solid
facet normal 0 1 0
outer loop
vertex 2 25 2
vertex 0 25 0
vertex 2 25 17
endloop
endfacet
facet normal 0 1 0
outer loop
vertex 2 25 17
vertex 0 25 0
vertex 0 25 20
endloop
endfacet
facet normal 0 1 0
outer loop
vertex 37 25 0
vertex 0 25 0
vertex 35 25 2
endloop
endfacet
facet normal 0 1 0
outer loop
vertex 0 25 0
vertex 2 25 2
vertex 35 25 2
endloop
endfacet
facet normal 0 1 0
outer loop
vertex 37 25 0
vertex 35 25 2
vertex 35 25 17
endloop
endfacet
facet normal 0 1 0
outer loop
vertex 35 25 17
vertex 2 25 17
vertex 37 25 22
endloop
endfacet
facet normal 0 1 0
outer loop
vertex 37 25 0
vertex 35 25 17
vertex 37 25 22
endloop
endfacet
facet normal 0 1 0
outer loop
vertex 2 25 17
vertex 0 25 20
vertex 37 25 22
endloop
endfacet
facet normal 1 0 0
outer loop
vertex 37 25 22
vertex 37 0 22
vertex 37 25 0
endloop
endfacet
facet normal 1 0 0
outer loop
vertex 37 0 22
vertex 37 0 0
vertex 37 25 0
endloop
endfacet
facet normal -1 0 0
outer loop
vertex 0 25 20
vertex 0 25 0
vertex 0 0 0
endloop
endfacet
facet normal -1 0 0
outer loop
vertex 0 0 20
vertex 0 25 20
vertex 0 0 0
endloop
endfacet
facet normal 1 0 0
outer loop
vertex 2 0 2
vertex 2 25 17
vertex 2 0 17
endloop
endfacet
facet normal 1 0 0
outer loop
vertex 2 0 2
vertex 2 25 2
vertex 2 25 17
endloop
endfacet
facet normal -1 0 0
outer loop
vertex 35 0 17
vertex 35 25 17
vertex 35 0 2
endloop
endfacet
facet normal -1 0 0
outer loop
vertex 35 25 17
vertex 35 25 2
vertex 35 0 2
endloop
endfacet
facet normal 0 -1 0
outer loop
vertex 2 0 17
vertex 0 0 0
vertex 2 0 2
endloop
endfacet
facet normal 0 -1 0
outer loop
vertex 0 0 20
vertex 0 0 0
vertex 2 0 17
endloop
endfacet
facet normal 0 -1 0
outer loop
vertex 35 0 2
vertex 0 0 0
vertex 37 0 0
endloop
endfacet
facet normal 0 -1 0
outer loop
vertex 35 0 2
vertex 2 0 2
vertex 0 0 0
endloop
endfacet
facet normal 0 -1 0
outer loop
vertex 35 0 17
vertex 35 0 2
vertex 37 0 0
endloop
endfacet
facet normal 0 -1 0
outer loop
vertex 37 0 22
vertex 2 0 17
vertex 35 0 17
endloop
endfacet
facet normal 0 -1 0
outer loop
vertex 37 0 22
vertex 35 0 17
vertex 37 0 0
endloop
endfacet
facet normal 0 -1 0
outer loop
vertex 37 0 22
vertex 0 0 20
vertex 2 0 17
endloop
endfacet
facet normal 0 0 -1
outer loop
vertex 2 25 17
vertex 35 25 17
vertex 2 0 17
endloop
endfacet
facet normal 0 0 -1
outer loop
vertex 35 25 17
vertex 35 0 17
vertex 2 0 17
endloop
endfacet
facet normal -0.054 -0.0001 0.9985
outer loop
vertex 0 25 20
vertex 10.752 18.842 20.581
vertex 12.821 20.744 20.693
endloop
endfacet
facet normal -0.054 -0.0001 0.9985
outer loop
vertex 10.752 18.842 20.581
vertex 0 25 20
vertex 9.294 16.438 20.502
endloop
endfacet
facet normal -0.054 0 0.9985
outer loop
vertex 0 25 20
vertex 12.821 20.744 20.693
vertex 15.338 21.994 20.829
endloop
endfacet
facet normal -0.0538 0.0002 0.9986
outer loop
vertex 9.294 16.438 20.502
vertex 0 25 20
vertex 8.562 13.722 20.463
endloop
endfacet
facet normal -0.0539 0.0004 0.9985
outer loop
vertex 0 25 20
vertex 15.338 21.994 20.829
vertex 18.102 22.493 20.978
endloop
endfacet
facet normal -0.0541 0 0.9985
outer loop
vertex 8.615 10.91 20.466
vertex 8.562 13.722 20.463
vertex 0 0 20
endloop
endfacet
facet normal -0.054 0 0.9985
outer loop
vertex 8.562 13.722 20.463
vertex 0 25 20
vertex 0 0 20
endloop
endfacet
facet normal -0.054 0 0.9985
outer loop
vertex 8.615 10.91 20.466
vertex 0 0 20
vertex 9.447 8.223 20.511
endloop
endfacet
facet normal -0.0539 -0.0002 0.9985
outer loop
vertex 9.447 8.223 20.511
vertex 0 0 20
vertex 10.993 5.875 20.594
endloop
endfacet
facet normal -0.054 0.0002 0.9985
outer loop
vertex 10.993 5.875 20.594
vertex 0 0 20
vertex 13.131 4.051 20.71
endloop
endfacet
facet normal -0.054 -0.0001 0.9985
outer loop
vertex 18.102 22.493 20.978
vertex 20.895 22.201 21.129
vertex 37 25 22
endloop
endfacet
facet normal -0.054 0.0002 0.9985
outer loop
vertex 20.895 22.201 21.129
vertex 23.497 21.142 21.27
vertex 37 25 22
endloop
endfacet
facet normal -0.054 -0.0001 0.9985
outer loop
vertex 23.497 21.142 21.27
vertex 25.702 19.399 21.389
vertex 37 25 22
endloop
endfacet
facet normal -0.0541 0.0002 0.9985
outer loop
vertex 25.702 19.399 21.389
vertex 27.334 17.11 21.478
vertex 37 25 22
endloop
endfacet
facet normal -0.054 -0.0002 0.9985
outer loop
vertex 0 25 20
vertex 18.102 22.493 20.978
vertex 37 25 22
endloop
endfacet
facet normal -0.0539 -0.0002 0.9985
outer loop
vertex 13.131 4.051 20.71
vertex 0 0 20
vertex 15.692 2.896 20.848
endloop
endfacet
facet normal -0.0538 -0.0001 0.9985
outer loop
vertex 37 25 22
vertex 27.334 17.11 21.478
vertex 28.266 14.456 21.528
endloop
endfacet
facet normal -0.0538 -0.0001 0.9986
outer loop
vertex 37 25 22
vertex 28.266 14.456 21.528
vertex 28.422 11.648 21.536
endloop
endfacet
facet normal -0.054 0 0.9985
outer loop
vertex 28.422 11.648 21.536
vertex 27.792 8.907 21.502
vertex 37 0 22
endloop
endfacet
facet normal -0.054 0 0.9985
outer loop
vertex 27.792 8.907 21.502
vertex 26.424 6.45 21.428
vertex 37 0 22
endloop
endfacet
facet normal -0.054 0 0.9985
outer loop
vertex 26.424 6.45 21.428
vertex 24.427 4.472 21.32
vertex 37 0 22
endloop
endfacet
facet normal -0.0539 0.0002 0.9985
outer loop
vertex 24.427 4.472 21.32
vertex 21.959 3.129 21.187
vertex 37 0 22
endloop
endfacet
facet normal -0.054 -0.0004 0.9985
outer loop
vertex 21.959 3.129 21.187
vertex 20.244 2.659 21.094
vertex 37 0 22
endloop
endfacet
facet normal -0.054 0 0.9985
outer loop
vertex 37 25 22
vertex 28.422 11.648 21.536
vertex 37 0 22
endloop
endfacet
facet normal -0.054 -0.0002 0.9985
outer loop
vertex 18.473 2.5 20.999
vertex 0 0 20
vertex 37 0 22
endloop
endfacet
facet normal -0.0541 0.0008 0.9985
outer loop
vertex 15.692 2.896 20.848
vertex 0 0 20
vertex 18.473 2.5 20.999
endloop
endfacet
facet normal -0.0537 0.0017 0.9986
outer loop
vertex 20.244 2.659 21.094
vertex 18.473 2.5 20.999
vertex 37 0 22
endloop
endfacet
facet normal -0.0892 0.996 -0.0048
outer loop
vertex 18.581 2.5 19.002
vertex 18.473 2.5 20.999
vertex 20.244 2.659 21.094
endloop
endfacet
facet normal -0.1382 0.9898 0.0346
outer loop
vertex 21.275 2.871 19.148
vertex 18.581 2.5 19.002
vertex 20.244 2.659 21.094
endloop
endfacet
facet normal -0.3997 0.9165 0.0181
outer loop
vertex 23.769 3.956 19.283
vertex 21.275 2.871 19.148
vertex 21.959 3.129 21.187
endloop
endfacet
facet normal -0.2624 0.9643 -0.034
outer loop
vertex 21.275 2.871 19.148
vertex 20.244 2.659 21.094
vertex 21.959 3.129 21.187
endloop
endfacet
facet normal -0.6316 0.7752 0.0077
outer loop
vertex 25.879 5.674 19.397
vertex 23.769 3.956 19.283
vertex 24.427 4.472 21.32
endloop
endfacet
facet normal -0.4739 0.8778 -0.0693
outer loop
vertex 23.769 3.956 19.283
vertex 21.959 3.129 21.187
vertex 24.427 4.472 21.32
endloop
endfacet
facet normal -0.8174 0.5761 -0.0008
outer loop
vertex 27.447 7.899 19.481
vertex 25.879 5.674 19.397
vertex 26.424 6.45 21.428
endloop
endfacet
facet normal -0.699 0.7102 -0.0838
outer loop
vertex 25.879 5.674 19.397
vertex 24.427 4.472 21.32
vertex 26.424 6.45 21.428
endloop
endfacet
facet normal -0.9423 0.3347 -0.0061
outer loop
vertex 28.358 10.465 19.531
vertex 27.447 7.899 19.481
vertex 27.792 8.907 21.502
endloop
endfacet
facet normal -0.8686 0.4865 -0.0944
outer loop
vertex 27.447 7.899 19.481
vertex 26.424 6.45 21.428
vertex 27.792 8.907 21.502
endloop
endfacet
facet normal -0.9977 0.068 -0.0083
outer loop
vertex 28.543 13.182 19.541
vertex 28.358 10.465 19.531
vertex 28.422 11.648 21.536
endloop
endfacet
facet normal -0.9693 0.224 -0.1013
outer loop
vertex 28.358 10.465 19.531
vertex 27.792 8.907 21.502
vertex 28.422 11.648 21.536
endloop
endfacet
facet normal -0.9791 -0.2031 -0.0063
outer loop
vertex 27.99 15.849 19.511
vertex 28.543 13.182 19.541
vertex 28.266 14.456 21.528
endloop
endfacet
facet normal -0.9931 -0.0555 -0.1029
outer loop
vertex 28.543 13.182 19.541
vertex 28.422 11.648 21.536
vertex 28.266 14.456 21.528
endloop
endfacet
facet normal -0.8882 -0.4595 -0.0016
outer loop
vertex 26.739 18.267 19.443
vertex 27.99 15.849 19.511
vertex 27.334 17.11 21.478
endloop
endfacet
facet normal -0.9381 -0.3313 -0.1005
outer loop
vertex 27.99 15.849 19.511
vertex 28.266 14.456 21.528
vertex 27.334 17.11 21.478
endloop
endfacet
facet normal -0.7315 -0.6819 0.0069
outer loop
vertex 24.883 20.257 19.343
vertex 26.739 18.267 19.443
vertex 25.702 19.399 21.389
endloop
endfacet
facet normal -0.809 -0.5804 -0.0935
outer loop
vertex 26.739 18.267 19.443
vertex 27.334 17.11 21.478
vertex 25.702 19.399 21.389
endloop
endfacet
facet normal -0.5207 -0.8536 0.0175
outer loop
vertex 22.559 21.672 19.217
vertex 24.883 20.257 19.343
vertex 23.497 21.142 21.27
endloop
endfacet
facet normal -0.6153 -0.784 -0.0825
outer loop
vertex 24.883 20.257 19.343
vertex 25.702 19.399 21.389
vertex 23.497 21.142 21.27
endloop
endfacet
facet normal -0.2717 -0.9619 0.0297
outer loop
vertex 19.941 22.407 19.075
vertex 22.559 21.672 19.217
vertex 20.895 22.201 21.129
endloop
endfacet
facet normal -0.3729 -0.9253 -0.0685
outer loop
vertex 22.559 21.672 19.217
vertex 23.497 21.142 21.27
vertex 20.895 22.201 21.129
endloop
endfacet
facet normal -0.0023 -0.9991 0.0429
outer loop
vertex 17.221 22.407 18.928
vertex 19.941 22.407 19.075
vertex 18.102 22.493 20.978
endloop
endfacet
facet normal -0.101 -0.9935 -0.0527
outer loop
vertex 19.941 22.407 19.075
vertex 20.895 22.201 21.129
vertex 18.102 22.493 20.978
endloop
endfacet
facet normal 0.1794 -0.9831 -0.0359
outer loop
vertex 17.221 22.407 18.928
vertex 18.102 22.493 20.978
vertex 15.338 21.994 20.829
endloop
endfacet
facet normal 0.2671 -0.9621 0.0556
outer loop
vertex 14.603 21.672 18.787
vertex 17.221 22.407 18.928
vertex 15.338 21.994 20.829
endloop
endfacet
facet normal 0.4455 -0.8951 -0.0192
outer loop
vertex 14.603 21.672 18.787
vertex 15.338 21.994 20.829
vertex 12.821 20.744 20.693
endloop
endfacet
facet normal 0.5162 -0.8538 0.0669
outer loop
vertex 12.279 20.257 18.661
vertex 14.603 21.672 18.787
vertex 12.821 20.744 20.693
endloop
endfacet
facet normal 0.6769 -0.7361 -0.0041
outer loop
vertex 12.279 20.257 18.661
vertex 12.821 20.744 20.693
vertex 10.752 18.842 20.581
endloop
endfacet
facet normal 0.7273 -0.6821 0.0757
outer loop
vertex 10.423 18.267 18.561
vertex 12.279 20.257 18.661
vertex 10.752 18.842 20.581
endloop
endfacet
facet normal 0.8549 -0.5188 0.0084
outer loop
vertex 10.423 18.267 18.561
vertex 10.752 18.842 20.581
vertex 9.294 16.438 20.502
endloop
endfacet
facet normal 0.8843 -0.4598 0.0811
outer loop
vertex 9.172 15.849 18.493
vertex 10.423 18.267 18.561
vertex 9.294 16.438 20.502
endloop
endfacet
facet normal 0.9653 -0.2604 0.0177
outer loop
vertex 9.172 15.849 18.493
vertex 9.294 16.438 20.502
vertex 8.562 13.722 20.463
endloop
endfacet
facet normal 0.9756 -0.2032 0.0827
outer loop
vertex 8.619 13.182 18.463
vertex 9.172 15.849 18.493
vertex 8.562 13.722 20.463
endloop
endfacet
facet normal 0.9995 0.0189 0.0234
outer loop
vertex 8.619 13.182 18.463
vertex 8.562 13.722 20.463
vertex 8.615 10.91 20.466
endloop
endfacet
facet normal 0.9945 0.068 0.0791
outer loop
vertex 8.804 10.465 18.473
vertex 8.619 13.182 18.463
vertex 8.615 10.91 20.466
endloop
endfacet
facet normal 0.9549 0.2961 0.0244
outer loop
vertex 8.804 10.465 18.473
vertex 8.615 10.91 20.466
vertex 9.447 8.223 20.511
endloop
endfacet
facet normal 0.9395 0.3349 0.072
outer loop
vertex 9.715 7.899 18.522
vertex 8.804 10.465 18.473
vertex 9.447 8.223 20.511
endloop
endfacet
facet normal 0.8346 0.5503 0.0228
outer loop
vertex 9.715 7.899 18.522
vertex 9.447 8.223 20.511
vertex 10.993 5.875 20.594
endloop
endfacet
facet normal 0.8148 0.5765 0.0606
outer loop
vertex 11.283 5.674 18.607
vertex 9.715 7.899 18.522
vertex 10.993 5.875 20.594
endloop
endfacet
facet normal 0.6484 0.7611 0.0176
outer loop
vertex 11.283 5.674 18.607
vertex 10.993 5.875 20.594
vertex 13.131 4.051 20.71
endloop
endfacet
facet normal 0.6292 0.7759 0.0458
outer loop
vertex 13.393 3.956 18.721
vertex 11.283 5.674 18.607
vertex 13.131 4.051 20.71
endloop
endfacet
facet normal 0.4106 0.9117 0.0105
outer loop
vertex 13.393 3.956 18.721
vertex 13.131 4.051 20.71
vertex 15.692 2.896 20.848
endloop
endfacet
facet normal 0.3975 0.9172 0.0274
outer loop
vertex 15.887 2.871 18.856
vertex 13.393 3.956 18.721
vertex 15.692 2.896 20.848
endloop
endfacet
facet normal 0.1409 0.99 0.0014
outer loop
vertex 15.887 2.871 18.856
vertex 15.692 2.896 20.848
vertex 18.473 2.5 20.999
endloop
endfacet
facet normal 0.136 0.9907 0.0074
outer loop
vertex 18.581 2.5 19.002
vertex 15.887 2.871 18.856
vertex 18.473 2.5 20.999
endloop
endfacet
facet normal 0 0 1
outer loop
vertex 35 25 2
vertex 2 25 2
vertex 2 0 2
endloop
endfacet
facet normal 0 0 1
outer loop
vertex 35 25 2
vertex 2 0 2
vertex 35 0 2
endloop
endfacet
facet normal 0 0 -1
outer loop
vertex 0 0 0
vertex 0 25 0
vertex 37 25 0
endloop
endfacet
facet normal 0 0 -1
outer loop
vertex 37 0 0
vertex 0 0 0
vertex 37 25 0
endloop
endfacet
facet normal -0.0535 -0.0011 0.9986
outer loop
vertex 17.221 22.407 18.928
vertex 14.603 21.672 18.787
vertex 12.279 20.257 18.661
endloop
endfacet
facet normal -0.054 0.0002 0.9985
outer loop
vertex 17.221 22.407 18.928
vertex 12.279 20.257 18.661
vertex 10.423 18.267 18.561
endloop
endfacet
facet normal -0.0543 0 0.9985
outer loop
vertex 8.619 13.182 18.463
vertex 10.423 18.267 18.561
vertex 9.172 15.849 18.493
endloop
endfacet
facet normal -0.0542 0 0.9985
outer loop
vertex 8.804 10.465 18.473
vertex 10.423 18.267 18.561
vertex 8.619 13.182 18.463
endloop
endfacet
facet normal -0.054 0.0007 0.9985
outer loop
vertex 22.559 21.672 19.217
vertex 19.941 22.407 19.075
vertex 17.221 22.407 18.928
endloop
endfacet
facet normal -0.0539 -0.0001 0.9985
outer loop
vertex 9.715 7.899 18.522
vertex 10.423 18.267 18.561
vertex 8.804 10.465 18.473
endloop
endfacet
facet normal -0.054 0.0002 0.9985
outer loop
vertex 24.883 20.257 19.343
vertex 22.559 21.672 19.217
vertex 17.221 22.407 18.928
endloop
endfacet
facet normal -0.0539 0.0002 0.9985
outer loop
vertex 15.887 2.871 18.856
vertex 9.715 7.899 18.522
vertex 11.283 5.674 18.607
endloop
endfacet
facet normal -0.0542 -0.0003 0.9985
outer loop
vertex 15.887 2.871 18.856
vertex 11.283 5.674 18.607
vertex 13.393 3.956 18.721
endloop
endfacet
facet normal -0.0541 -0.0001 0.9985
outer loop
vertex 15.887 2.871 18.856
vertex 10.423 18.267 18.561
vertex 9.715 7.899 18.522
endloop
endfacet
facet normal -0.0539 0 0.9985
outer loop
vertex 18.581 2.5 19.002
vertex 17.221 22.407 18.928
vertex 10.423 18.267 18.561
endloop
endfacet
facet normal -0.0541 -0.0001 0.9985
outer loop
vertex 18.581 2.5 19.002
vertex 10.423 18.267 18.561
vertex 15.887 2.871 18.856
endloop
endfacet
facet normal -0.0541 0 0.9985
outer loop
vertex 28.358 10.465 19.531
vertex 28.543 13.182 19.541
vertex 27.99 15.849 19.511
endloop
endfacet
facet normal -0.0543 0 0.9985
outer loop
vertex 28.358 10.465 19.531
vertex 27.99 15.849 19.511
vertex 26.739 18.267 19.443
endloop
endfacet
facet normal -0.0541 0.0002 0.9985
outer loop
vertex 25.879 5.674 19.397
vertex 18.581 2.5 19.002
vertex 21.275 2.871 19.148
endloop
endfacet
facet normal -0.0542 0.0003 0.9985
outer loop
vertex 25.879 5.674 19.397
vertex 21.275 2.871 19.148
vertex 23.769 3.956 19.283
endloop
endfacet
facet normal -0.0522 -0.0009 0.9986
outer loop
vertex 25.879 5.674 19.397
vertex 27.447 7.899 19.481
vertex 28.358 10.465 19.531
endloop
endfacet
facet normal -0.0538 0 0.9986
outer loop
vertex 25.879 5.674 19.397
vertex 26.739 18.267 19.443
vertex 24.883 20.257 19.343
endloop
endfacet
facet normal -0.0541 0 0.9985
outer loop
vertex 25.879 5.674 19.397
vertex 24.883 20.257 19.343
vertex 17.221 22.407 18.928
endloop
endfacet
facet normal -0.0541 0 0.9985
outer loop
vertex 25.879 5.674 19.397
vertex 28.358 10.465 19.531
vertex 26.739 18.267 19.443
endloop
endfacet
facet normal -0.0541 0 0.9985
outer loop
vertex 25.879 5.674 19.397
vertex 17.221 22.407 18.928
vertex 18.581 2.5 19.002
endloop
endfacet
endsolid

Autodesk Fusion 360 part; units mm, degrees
sketch "Sketch1" plane through (0, 0, 0) normal (0, 0, 1) x (1, 0, 0)
  line L0 (0, 0) -> (37, 0)
  line L1 (37, 0) -> (37, 25)
  line L2 (37, 25) -> (0, 25)
  line L3 (0, 25) -> (0, 0)
  dimension "d1" = 37
  dimension "d2" = 25
extrude "Extrude1" add sketch "Sketch1" along normal blind 2
sketch "Sketch2" plane through (0, 0, 2) normal (0, 0, 1) x (-1, 0, 0)
  line L0 (0, -25) -> (0, 0)
  line L1 (0, 0) -> (-37, 0)
  line L2 (-37, 0) -> (-37, -25)
  line L3 (-37, -25) -> (0, -25)
  line L4 (0, -25) -> (-2, -25)
  line L5 (-2, -25) -> (-2, 0)
  line L6 (-2, 0) -> (0, 0)
  line L7 (0, 0) -> (0, -25)
  line L8 (-37, -25) -> (-35, -25)
  line L9 (-35, -25) -> (-35, 0)
  line L10 (-35, 0) -> (-37, 0)
  line L11 (-37, 0) -> (-37, -25)
  dimension "d5" = 2
  dimension "d6" = 25
  dimension "d7" = 2
  dimension "d8" = 25
extrude "Extrude2" add sketch "Sketch2" along normal blind 16 contours L0 L1 L3 L4 L5 L6 L7 | L1 L2 L3 L8 L9 L10 L11
sketch "Sketch3" plane through (0, 0, 18) normal (0, 0, 1) x (-1, 0, 0)
  line L0 (-37, 0) -> (-37, -25)
  line L1 (-37, -25) -> (-35, -25)
  line L2 (-35, -25) -> (-35, 0)
  line L3 (-35, 0) -> (-37, 0)
  line L4 (0, -25) -> (-37, -25)
  line L5 (-37, -25) -> (-37, 0)
  line L6 (-37, 0) -> (0, 0)
  line L7 (0, 0) -> (0, -25)
extrude "Extrude3" add sketch "Sketch3" along normal blind 20
sketch "Sketch4" plane through (0, 0, 0) normal (0, -1, 0) x (1, 0, 0)
  line L0 (0, 38) -> (0, 0)
  line L1 (0, 0) -> (37, 0)
  line L2 (37, 0) -> (37, 38)
  line L3 (37, 38) -> (0, 38)
  line L4 (2, 18) -> (35, 18)
  line L5 (35, 18) -> (35, 2)
  line L6 (35, 2) -> (2, 2)
  line L7 (2, 2) -> (2, 18)
  line L8 (0, 20) -> (37, 22)
extrude "Extrude4" cut sketch "Sketch4" against normal blind 40 contours L0 L2 L3 L8
sketch "Sketch5" plane through (-1.0779, 0, 19.9417) normal (-0.054, 0, 0.9985) x (0, -1, 0)
  line L0 (-25, 38.1335) -> (-25, 1.0795)
  line L1 (-25, 1.0795) -> (0, 1.0795)
  line L2 (0, 1.0795) -> (0, 38.1335)
  line L3 (0, 38.1335) -> (-25, 38.1335)
  line L4 (-25, 1.0795) -> (-12.5, 1.0795)
  line L5 (-12.5, 1.0795) -> (-12.5, 19.5795)
  line L6 (-12.5, 19.5795) -> (-25, 19.5795)
  line L7 (-25, 19.5795) -> (-25, 1.0795)
  circle A0 centre (-12.5, 19.5795) radius 10
  dimension "d15" = 12.5
  dimension "d16" = 18.5
  dimension "d17" = 20
extrude "Extrude5" cut sketch "Sketch5" against normal blind 2 contours L5 L6 A0 | L5 L6 A0
extrude "Extrude6" add 1 faces at (24, 8.3333, 18) along direction (0, 0, -1) blind 1
